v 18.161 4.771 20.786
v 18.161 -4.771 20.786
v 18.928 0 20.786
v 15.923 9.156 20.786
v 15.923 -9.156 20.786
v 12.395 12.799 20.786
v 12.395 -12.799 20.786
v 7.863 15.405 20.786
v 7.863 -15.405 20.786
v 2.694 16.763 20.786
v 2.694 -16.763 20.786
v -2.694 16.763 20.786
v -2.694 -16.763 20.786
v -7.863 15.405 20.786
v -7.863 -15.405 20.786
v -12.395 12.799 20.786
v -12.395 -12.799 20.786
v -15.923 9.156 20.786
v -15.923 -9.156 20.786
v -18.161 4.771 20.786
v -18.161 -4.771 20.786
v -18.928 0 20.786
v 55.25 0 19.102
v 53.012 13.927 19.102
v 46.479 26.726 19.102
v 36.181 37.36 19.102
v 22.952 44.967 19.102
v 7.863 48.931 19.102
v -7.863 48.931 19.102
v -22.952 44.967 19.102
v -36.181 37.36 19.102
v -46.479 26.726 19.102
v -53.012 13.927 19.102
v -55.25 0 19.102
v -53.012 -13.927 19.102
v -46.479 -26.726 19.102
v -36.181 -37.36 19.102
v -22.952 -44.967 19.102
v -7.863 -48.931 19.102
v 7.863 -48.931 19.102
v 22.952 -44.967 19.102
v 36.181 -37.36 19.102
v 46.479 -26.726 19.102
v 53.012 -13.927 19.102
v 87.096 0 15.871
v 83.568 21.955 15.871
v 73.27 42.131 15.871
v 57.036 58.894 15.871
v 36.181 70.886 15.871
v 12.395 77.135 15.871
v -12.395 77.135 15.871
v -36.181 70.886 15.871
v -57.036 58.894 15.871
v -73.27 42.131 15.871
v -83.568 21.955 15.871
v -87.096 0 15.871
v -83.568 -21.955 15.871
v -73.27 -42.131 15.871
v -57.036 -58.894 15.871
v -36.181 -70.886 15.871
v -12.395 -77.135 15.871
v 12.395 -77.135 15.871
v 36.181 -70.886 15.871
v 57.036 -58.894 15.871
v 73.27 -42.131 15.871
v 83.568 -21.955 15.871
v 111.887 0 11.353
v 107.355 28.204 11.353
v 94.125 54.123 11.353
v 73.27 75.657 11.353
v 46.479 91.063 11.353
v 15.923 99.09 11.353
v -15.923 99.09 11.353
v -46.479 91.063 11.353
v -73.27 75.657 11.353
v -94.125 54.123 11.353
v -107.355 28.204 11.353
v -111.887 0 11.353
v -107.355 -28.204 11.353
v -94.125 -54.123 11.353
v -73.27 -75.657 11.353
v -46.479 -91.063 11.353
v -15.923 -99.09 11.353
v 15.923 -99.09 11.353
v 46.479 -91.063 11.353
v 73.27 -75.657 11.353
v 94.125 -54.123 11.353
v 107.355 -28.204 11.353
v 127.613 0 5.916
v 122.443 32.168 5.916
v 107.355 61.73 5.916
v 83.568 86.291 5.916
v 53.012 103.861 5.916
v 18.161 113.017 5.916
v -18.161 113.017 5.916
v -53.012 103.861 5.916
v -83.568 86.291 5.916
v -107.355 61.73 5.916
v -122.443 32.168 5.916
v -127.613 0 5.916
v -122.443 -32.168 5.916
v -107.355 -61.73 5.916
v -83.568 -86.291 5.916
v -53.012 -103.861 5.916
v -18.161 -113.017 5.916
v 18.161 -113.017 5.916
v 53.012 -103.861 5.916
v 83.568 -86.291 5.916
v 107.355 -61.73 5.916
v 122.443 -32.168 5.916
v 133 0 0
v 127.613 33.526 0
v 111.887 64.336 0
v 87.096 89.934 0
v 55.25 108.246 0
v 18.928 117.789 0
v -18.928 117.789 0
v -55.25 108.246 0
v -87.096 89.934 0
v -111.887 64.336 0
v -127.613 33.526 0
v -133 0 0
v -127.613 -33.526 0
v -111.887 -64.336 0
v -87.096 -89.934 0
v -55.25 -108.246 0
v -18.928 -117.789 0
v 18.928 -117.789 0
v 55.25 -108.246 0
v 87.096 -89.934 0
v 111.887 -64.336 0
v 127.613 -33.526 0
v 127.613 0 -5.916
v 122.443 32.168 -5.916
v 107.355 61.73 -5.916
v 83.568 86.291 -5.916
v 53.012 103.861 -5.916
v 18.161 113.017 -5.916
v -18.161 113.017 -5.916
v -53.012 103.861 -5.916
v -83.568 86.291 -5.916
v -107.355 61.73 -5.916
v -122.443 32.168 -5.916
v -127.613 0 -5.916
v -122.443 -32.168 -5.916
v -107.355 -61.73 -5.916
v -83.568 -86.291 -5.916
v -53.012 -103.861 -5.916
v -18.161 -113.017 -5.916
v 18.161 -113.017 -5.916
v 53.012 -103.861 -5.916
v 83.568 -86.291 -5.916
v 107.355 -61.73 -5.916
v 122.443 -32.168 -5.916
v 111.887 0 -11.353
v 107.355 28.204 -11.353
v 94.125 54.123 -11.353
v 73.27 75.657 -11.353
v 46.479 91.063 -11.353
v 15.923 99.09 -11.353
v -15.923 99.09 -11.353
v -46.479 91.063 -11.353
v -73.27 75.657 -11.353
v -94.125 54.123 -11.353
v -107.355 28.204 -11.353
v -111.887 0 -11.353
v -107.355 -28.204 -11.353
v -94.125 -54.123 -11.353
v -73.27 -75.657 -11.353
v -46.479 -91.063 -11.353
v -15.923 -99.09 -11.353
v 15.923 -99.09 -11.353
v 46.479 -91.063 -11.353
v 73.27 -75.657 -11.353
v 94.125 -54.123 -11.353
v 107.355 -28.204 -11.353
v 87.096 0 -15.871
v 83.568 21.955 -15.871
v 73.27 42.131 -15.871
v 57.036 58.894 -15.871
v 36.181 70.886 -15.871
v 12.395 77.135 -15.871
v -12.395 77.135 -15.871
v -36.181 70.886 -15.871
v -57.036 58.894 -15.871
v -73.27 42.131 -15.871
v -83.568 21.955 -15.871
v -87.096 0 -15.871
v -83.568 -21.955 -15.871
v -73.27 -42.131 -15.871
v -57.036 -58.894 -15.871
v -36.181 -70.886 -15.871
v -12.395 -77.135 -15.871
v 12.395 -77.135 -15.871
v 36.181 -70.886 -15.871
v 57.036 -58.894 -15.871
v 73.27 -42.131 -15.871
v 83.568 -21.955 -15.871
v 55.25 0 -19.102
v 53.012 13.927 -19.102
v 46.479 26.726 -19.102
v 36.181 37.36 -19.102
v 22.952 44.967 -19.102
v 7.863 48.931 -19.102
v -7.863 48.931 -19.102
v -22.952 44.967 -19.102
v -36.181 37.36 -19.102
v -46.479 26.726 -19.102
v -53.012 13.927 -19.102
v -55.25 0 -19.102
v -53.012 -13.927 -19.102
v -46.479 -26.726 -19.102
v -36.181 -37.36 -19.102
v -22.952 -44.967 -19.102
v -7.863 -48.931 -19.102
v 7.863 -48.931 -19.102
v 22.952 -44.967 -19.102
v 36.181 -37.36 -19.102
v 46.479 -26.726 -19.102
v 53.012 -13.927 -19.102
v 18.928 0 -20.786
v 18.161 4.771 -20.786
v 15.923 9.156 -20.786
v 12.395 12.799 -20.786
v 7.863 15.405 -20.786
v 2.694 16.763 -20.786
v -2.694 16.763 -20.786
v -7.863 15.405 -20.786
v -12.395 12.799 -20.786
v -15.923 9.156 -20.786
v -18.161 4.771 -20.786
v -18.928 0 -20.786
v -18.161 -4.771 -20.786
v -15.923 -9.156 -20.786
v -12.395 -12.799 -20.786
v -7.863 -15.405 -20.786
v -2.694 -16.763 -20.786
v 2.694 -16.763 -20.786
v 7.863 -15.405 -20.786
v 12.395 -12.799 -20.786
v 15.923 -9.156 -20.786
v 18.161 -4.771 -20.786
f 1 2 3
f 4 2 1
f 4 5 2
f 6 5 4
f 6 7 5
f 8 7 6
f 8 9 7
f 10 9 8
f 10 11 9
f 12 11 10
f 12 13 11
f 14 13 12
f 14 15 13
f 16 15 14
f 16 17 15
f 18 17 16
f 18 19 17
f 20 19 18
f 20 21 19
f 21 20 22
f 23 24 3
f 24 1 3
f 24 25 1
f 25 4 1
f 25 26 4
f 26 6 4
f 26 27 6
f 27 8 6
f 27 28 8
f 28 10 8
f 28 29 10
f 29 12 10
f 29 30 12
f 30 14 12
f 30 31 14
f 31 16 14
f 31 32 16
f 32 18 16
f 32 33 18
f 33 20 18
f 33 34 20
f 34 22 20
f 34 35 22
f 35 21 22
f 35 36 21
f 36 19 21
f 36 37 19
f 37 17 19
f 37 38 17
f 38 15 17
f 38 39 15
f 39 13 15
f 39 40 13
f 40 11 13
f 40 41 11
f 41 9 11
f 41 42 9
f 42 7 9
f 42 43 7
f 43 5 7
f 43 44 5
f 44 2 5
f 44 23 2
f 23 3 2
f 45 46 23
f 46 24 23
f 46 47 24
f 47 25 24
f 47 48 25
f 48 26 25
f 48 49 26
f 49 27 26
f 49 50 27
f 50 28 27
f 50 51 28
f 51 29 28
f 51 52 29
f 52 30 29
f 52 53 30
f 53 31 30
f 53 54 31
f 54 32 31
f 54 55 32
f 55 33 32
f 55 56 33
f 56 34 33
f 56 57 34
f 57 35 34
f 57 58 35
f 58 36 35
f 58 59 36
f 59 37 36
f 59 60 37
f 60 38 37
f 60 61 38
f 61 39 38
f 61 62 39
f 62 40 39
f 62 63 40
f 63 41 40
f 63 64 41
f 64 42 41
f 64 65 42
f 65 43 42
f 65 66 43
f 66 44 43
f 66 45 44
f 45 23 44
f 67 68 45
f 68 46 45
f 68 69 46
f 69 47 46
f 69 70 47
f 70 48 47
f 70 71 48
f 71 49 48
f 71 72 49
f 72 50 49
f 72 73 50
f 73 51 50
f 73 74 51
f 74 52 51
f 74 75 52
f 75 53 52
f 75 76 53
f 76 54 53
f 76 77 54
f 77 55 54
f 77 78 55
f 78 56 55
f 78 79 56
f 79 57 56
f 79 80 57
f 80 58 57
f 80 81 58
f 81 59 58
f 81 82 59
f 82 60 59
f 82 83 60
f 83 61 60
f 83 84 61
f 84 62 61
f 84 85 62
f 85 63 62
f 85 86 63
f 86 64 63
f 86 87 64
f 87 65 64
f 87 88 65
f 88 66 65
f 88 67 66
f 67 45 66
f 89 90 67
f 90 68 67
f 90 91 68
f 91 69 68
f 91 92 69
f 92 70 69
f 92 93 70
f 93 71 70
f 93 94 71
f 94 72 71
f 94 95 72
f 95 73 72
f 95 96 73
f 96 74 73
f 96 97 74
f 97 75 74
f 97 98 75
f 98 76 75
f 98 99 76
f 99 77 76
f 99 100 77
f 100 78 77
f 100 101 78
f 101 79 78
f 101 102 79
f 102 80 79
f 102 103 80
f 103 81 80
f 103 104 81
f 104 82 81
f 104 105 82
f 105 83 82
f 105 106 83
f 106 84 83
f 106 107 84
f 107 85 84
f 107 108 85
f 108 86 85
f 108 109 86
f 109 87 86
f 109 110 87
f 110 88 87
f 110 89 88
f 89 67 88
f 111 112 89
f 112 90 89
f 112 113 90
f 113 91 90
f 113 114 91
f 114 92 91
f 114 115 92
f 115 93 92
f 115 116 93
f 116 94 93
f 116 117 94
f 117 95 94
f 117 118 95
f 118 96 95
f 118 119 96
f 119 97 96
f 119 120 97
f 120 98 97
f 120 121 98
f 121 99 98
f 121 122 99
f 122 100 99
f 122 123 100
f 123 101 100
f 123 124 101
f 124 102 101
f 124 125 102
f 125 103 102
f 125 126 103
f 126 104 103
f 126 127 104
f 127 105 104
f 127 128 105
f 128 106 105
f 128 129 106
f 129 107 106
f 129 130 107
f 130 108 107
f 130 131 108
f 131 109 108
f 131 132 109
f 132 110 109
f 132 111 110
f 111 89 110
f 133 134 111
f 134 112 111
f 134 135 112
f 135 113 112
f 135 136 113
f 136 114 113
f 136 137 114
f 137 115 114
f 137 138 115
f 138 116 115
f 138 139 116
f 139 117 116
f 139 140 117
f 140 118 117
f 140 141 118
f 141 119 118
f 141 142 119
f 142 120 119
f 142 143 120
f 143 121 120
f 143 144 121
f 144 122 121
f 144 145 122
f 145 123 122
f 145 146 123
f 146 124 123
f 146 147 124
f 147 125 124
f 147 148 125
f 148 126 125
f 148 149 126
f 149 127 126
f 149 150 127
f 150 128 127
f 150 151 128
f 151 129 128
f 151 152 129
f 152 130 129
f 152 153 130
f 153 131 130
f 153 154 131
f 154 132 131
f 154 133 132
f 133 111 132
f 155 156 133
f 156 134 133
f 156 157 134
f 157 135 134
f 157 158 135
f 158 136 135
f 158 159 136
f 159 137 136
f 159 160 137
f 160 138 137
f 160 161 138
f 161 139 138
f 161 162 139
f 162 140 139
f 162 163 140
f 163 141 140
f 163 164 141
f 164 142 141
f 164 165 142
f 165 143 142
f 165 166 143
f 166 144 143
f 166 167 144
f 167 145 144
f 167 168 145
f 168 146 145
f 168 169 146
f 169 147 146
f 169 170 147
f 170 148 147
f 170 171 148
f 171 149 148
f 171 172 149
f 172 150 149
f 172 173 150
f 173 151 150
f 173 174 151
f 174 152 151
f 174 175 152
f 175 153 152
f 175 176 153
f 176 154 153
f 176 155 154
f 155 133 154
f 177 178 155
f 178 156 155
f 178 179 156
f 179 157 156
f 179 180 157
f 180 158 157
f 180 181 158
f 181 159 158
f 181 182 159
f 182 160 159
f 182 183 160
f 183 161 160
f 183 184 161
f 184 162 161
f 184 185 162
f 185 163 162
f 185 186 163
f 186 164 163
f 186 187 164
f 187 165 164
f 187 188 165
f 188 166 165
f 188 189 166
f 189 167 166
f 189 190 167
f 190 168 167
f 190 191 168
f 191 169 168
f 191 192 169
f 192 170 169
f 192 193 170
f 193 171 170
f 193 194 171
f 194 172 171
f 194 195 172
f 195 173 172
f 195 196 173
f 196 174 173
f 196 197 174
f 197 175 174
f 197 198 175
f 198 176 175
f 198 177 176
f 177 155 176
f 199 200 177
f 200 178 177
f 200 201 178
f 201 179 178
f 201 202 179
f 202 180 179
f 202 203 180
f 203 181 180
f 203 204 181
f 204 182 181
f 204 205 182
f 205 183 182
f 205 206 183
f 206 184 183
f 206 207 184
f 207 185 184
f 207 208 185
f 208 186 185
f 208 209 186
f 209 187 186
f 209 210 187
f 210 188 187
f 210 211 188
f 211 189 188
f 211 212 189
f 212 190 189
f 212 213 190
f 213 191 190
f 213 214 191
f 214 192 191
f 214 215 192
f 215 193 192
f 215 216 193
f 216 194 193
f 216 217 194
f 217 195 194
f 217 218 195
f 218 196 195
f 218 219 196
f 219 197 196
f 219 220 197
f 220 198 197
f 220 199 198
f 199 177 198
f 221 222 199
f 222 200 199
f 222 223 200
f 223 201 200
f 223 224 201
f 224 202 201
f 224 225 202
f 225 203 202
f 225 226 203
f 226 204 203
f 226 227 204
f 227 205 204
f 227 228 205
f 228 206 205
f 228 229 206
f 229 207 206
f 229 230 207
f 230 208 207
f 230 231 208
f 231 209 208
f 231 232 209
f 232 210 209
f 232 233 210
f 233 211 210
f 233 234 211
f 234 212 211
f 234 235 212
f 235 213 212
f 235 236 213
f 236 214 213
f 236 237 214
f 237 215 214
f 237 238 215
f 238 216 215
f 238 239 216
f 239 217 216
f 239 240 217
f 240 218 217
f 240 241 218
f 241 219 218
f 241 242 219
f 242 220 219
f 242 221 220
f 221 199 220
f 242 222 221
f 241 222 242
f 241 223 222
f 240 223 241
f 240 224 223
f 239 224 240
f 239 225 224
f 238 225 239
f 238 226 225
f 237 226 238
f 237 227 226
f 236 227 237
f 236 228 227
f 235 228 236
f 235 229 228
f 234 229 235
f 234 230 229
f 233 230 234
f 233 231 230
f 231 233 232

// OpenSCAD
// Generated by SolidPython 1.0.1 on 2020-07-29 00:46:54


scale(v = [19, 17, 3]) {
	sphere(r = 7);
}
/***********************************************
*********      SolidPython code:      **********
************************************************
 
# import packages: SolidPython
from solid import *
from solid.utils import *
from itertools import chain, combinations, permutations


class Resize:

    def __init__(self, scad_file):
        self.scad_file = scad_file
        #self.scad_file = import_scad(scad_file)
        # cone/cylinder param:
        self.r1 = 0
        self.r2 = 0
        self.h = 0
        # rectangular prism param:
        self.w = 0
        self.l = 0
        # ellipse param:
        self.r = 0

    # import OpenScad code (file name corresponds to shape)


    # classify shape + parameters
    def assign(self, param1, param2, param3):
        if self.scad_file == 'cone.scad':
            self.r1 = param1
            self.r2 = param2
            self.h = param3
        elif self.scad_file == 'cylinder.scad':
            self.r1 = param1
            self.r2 = param2
            self.h = param3
        elif self.scad_file == 'rectangularPrism.scad':
            self.h = param1
            self.l = param2
            self.w = param3
        else:
            self.r = param1
            self.h = param2

    # resize parameters
    def iterate(self):
        x = range(3, 20, 2)
        i = 1
        if self.scad_file == 'cone.scad':
            tempList = list(permutations(x, 2))
            for temp in tempList:
                param1 = temp[0]
                param2 = temp[1]
                filepath = 'produced_scad_files/' + 'cone' + str(param1) + '_' + str(param2) + '_' + '.scad'
                scad_render_to_file(cylinder(h=param1, r1=param2, r2=0), filepath)

        elif self.scad_file == 'cylinder.scad':
            tempList = list(permutations(x, 3))
            for temp in tempList:
                param1 = temp[0]
                param2 = temp[1]
                filepath = 'produced_scad_files/' + 'cylinder' + str(param1) + '_' + str(param2) + '_' + '.scad'
                scad_render_to_file(cylinder(h=param1, r1=param2, r2=param2), filepath)

        elif self.scad_file == 'rectangularPrism.scad':
            tempList = list(permutations(x, 3))
            for temp in tempList:
                param1 = temp[0]
                param2 = temp[1]
                param3 = temp[2]
                filepath = 'produced_scad_files/' + 'rectangularPrism' + str(param1) + '_' + str(param2) + '_' + str(
                    param3) + '.scad'
                scad_render_to_file(cube(size=(param1, param2, param3)), filepath)

        elif self.scad_file == 'ellipse.scad':
            tempList = list(permutations(x, 4))
            for temp in tempList:
                param1 = temp[0]
                param2 = temp[1]
                param3 = temp[2]
                param4 = temp[3]
                filepath = 'produced_scad_files/' + 'ellipse' + str(param1) + '_' + str(param2) + '_' + str(param3) + '_' + str(param4) + '.scad'
                scad_render_to_file(scale([param1, param2, param3])(sphere(r=param4)), filepath)

    def render_to_scadfile(self):
        scad_render_to_file(scad, 'example.scad') 
 
************************************************/
